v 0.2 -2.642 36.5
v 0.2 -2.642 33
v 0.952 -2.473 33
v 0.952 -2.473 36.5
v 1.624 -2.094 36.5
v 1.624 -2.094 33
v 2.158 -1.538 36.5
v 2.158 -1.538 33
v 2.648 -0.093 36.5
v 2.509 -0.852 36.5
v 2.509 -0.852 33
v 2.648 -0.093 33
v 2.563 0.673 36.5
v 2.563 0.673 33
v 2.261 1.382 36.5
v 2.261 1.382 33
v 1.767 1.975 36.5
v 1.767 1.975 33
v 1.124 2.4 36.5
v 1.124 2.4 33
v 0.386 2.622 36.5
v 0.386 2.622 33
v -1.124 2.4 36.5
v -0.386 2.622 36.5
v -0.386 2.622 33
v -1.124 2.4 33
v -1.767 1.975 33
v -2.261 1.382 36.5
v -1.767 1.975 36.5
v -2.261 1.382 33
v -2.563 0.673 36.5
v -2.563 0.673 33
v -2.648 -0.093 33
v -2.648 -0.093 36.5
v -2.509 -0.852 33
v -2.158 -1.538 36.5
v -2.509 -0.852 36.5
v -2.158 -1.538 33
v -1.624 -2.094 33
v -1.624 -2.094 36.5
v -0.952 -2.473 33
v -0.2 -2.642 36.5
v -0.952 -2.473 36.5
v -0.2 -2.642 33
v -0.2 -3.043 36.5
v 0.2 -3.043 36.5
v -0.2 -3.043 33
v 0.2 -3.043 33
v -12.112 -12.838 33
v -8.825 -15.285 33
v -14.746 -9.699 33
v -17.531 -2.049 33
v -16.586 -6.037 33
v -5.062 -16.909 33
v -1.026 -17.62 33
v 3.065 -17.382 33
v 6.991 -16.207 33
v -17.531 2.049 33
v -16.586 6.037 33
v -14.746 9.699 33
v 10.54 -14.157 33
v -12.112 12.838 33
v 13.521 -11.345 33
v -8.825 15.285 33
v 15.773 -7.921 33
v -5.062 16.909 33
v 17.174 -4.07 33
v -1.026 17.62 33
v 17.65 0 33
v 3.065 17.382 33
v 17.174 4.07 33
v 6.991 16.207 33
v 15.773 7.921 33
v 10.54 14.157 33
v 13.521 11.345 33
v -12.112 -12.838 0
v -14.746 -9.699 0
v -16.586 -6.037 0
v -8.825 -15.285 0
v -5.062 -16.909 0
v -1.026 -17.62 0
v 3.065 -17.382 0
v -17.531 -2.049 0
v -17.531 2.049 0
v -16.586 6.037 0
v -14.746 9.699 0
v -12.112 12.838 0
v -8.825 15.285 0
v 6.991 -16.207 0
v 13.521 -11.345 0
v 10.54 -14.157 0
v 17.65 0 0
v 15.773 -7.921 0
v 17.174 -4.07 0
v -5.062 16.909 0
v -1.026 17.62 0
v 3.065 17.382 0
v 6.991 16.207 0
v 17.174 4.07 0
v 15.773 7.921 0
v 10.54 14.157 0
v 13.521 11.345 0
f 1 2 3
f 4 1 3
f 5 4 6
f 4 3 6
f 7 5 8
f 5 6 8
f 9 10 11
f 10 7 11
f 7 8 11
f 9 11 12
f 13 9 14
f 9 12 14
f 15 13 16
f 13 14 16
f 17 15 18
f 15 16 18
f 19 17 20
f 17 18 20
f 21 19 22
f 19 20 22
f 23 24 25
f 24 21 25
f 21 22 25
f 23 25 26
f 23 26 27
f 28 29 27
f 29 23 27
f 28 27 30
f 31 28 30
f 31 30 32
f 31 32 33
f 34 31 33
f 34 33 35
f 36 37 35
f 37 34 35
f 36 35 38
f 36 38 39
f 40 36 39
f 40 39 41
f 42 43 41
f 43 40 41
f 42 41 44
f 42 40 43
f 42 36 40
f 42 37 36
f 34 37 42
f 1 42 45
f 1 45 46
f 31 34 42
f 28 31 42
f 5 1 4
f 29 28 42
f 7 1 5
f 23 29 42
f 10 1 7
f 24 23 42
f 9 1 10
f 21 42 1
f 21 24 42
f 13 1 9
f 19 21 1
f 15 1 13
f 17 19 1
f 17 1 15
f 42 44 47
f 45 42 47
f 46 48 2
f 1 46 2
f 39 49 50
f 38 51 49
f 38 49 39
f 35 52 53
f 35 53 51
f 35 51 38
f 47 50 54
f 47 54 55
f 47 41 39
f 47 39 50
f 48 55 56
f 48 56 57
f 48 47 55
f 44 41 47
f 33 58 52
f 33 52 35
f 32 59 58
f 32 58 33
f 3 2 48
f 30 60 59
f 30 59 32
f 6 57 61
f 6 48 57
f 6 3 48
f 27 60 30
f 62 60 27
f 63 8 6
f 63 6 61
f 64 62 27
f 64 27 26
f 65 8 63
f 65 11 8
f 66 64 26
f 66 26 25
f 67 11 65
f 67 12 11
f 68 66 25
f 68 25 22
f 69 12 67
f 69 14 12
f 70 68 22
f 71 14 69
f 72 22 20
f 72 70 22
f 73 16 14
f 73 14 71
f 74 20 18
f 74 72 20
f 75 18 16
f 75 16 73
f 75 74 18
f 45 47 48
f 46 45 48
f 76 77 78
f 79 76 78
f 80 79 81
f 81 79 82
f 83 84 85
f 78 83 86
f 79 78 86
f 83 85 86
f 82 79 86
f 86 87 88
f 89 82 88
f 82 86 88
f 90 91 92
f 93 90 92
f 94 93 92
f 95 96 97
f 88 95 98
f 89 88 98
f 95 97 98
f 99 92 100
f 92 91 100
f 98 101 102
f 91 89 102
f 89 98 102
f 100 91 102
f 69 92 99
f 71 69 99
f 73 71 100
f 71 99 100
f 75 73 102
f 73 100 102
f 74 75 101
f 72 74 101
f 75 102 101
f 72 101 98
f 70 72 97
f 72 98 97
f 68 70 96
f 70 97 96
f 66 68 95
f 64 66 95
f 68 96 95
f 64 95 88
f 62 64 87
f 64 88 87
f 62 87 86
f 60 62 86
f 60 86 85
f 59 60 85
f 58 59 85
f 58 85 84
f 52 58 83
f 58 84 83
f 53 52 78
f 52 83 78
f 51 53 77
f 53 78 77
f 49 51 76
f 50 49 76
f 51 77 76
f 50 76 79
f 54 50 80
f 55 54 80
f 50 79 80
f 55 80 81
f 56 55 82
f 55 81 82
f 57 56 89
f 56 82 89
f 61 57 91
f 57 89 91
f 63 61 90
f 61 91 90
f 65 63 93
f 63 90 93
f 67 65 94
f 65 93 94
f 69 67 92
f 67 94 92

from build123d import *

# Parameters (mm, degrees)
F0_R     = 17.65
F1_DEPTH = 33
F2_R     = 2.65
F3_DEPTH = 3.5
F5_DEPTH = 3.5


with BuildPart() as f1:
    # F0 (on Top) → F1 (new body)
    with BuildSketch(Plane.XY):
        Circle(F0_R)
    extrude(amount=F1_DEPTH)

    # F2 (on face) → F3 (join)
    with BuildSketch(Plane.XY.offset(33)):
        Circle(F2_R)
    extrude(amount=F3_DEPTH)

    # F4 (on face) → F5 (join)
    with BuildSketch(Plane.XY.offset(33)):
        with BuildLine():
            ThreePointArc((0.2, -2.6424420523), (0, -2.65), (-0.2, -2.6424420523))
            Line((-0.2, -2.6424420523), (-0.2, -3.0434355587))
            Line((-0.2, -3.0434355587), (0, -3.0434355587))
            Line((0, -3.0434355587), (0.2, -3.0434355587))
            Line((0.2, -3.0434355587), (0.2, -2.6424420523))
        make_face()
    extrude(amount=F5_DEPTH)


solid = f1.part
